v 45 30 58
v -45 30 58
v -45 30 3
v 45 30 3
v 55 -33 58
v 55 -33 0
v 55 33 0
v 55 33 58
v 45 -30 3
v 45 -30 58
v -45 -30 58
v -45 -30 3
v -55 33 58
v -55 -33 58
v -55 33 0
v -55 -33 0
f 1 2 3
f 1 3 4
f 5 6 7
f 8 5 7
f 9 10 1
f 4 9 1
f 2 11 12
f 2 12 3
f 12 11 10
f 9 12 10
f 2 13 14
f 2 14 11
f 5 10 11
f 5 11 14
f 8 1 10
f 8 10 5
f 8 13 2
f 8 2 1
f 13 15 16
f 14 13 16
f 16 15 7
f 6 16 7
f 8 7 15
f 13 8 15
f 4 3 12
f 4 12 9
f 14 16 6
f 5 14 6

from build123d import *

# Parameters (mm, degrees)
F0_W     = 90
F0_H     = 60
F1_DEPTH = 58
F2_W     = 90
F2_H     = 60
F3_DEPTH = 55
F4_DEPTH = 55


with BuildPart() as f1:
    # F0 (on Top) → F1 (new body)
    with BuildSketch(Plane.XY):
        Polygon((55, 33), (48, 33), (-48, 33), (-55, 33), (-55, -33), (-48, -33), (48, -33), (55, -33), align=None)
        Rectangle(F0_W, F0_H, mode=Mode.SUBTRACT)
        Rectangle(F0_W, F0_H)
    extrude(amount=F1_DEPTH)

    # F2 (on face) → F3 (join)
    with BuildSketch(Plane.XY.offset(58)):
        Rectangle(F2_W, F2_H)
    extrude(amount=-F3_DEPTH)

    # F2 (on face) → F4 (cut)
    with BuildSketch(Plane.XY.offset(58)):
        Rectangle(F2_W, F2_H)
    extrude(amount=-F4_DEPTH, mode=Mode.SUBTRACT)


solid = f1.part
